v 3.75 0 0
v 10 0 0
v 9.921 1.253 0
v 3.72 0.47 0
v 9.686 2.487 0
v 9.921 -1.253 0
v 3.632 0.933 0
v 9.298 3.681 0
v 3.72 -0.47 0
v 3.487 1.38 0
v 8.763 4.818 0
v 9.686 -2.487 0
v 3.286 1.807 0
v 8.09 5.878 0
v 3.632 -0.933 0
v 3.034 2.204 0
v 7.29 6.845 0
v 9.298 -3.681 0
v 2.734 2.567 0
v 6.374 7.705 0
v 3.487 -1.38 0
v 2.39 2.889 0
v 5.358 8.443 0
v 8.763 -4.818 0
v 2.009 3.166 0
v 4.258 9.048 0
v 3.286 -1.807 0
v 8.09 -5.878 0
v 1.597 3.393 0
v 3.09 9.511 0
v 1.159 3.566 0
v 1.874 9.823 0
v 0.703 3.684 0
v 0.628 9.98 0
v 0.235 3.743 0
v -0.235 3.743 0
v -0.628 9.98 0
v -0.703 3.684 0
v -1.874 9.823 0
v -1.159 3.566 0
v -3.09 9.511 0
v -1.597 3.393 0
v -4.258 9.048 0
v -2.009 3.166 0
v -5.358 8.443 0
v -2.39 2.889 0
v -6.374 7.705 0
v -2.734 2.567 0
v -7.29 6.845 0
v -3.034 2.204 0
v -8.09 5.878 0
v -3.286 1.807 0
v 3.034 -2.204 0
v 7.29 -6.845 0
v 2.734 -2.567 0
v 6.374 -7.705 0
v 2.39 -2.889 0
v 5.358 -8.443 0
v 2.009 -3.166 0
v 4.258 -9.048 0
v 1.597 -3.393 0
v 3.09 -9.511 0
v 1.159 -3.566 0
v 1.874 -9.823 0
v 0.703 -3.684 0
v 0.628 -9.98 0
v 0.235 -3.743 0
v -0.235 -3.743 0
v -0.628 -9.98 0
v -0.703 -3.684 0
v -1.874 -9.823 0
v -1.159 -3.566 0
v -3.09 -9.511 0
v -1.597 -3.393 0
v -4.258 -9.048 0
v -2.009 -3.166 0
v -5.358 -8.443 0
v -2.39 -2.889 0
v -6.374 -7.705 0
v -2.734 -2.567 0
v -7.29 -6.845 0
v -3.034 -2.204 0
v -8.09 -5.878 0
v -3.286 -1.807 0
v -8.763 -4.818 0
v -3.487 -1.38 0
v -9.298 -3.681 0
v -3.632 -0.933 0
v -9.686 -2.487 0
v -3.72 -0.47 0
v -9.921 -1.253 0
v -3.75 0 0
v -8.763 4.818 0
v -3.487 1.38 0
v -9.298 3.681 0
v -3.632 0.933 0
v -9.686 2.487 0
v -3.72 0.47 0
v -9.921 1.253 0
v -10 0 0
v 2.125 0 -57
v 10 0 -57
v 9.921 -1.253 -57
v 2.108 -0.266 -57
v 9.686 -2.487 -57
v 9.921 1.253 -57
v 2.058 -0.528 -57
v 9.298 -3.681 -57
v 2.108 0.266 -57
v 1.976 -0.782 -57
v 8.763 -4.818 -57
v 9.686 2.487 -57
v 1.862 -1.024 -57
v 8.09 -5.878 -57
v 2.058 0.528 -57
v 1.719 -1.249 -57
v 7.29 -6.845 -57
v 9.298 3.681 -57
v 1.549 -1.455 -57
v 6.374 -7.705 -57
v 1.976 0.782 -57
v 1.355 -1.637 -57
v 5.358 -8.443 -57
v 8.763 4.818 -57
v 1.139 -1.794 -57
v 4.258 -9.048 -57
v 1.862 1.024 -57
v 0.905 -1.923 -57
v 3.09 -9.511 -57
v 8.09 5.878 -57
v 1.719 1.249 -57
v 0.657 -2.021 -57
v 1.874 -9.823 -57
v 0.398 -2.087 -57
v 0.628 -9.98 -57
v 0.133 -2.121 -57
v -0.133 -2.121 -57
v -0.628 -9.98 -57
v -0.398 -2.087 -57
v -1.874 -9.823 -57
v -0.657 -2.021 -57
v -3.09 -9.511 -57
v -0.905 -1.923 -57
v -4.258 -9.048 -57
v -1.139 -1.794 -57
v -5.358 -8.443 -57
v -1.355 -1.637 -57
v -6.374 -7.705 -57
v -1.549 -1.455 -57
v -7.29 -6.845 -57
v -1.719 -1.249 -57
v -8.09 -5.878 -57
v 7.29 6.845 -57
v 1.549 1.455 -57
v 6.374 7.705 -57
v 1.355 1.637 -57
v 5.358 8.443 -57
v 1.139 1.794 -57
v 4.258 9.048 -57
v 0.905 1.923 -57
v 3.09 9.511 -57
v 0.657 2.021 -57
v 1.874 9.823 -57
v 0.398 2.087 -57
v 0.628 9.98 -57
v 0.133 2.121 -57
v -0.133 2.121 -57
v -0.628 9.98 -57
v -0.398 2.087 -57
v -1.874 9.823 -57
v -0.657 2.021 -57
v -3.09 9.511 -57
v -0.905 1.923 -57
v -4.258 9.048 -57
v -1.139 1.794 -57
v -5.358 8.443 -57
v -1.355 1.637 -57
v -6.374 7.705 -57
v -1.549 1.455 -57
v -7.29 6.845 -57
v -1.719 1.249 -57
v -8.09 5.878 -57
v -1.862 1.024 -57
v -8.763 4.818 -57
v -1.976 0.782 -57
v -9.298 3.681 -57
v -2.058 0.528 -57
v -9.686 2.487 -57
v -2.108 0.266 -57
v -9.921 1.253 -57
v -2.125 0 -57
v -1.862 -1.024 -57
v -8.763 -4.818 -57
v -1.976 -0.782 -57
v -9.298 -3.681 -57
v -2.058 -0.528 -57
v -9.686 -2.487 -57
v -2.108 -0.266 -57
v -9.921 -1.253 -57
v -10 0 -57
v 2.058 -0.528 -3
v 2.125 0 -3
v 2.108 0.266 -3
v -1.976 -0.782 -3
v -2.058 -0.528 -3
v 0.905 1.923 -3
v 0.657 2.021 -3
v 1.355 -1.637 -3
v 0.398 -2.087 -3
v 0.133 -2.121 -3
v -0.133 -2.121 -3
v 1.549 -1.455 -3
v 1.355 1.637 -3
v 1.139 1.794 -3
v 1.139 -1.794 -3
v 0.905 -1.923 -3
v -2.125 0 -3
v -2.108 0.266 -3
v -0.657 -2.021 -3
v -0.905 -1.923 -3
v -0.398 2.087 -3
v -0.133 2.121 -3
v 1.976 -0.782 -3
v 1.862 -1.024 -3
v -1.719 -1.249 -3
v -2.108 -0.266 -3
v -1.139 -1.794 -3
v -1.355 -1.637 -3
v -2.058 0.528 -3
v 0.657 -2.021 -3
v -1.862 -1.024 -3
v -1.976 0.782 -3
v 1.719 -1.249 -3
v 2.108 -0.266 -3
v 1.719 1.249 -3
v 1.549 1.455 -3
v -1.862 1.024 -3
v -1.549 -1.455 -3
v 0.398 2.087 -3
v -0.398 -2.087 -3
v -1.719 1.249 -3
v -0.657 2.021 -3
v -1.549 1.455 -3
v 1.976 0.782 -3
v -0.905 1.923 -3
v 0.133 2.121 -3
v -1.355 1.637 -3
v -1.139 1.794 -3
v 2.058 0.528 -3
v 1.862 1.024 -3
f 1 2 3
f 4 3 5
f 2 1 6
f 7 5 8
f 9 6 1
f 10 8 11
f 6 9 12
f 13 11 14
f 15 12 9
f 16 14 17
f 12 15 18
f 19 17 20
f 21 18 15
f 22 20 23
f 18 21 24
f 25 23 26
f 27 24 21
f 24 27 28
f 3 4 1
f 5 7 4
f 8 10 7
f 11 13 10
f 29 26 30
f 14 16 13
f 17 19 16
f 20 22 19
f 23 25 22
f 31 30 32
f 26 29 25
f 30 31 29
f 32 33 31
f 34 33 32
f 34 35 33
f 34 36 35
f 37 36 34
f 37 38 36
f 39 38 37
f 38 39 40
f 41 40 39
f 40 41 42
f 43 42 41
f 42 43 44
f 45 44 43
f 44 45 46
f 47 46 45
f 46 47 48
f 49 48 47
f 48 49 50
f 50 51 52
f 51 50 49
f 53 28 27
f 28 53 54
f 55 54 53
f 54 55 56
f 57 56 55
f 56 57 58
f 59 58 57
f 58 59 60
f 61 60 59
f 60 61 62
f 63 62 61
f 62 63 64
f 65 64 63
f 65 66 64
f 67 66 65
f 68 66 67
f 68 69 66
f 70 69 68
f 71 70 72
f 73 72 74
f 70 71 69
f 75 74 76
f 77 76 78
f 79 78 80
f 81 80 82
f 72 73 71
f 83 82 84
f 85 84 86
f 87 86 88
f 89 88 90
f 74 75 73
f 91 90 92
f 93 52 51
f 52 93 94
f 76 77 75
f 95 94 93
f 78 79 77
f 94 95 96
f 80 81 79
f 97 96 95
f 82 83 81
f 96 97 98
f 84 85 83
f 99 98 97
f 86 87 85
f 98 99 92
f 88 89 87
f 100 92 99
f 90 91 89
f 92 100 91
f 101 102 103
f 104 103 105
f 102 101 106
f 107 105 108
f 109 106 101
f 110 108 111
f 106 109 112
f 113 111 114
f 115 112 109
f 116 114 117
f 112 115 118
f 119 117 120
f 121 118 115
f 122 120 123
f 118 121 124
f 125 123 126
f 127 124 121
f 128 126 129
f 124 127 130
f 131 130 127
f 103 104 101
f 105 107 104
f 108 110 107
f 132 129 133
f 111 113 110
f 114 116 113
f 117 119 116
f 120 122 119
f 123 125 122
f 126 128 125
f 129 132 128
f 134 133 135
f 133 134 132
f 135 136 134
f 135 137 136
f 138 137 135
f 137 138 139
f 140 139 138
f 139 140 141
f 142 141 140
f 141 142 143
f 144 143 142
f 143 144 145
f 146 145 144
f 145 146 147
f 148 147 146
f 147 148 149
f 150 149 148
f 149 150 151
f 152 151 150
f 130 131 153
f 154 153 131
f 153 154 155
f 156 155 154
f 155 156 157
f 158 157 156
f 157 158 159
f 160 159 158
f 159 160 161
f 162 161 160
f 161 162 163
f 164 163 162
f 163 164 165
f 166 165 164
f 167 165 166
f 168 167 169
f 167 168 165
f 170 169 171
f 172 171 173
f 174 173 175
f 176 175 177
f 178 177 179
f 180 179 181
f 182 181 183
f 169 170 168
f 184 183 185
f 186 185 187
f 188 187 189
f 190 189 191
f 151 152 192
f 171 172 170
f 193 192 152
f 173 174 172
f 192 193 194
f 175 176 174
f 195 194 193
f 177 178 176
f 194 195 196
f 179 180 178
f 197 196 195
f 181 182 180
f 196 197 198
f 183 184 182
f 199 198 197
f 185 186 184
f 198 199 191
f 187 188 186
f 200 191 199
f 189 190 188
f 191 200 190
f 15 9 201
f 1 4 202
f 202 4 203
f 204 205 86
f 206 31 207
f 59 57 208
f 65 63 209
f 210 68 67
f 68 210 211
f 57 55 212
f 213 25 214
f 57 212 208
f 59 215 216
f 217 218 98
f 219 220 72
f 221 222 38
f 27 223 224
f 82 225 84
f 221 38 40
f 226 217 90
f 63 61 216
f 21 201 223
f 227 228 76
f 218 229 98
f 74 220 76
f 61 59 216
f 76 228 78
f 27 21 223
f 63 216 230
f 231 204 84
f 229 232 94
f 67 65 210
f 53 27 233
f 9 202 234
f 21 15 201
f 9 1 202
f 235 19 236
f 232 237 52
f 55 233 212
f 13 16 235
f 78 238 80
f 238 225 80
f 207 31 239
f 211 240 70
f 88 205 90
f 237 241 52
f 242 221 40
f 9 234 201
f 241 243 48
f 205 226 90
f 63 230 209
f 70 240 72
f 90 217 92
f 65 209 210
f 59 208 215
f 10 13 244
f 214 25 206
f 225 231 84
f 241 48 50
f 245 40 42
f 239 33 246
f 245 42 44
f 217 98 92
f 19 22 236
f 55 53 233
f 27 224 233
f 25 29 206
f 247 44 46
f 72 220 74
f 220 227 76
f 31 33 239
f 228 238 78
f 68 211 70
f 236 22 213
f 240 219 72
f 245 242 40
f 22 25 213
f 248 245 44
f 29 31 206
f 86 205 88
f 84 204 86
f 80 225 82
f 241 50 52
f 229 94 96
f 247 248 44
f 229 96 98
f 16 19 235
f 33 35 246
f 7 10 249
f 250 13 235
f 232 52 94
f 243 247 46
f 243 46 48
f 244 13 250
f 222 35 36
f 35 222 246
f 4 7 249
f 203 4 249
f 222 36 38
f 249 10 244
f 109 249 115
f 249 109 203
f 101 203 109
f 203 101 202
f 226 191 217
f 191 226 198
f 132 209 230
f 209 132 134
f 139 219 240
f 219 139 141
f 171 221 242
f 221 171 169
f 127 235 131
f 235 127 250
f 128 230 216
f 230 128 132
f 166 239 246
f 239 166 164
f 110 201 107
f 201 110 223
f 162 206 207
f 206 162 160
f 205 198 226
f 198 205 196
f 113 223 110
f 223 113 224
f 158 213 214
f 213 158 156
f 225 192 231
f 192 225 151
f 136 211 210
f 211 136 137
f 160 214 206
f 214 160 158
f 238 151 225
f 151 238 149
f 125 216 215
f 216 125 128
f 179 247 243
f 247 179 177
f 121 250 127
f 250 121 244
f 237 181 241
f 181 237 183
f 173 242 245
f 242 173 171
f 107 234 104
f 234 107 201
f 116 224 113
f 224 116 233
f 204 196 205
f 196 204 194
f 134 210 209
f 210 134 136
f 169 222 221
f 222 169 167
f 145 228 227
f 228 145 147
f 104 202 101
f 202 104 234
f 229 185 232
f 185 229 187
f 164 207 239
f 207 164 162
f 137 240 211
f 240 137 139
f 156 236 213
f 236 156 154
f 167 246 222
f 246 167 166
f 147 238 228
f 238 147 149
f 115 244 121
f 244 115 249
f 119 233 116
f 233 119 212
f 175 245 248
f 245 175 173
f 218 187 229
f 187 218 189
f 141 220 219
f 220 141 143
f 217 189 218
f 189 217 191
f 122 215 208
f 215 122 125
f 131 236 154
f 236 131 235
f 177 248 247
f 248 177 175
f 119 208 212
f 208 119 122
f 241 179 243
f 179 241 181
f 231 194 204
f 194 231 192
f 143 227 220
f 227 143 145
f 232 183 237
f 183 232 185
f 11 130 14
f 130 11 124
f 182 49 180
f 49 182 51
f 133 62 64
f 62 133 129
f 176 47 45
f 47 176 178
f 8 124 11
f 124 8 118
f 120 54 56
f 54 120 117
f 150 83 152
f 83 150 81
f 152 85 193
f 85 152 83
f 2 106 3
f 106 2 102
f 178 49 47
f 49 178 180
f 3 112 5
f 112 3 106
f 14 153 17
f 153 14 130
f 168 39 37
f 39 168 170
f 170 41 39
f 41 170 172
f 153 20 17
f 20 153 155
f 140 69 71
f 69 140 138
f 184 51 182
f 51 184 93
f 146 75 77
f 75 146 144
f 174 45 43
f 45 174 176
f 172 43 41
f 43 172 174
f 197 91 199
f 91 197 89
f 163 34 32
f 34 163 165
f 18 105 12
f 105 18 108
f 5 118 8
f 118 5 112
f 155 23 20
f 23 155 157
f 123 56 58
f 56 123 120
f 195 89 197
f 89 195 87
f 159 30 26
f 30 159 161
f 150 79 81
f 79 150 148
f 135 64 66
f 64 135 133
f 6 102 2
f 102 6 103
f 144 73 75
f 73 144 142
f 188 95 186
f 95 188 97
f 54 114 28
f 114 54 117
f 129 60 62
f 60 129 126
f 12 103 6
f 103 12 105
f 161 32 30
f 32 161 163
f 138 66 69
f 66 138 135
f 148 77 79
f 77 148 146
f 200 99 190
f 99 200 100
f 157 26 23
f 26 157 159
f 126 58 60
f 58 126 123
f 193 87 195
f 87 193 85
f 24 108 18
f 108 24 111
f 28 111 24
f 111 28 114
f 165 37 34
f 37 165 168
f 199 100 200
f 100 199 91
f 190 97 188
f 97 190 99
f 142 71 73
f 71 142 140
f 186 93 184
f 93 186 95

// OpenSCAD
$fn = 50;


difference() {
	union() {
		translate(v = [0, 0, -57.0000000000]) {
			cylinder(h = 57, r = 10.0000000000);
		}
		cylinder(h = 0, r = 13.0000000000);
	}
	union() {
		translate(v = [0, 0, 0]) {
			rotate(a = [0, 0, 0]) {
				difference() {
					union() {
						#translate(v = [0, 0, -57.0000000000]) {
							cylinder(h = 57, r = 2.0000000000);
						}
						#translate(v = [0, 0, -3]) {
							cylinder(h = 3, r1 = 2.1250000000, r2 = 3.7500000000);
						}
						#translate(v = [0, 0, -57.0000000000]) {
							cylinder(h = 57, r = 2.1250000000);
						}
						#translate(v = [0, 0, -57.0000000000]) {
							cylinder(h = 57, r = 2.0000000000);
						}
					}
					union();
				}
			}
		}
	}
}
